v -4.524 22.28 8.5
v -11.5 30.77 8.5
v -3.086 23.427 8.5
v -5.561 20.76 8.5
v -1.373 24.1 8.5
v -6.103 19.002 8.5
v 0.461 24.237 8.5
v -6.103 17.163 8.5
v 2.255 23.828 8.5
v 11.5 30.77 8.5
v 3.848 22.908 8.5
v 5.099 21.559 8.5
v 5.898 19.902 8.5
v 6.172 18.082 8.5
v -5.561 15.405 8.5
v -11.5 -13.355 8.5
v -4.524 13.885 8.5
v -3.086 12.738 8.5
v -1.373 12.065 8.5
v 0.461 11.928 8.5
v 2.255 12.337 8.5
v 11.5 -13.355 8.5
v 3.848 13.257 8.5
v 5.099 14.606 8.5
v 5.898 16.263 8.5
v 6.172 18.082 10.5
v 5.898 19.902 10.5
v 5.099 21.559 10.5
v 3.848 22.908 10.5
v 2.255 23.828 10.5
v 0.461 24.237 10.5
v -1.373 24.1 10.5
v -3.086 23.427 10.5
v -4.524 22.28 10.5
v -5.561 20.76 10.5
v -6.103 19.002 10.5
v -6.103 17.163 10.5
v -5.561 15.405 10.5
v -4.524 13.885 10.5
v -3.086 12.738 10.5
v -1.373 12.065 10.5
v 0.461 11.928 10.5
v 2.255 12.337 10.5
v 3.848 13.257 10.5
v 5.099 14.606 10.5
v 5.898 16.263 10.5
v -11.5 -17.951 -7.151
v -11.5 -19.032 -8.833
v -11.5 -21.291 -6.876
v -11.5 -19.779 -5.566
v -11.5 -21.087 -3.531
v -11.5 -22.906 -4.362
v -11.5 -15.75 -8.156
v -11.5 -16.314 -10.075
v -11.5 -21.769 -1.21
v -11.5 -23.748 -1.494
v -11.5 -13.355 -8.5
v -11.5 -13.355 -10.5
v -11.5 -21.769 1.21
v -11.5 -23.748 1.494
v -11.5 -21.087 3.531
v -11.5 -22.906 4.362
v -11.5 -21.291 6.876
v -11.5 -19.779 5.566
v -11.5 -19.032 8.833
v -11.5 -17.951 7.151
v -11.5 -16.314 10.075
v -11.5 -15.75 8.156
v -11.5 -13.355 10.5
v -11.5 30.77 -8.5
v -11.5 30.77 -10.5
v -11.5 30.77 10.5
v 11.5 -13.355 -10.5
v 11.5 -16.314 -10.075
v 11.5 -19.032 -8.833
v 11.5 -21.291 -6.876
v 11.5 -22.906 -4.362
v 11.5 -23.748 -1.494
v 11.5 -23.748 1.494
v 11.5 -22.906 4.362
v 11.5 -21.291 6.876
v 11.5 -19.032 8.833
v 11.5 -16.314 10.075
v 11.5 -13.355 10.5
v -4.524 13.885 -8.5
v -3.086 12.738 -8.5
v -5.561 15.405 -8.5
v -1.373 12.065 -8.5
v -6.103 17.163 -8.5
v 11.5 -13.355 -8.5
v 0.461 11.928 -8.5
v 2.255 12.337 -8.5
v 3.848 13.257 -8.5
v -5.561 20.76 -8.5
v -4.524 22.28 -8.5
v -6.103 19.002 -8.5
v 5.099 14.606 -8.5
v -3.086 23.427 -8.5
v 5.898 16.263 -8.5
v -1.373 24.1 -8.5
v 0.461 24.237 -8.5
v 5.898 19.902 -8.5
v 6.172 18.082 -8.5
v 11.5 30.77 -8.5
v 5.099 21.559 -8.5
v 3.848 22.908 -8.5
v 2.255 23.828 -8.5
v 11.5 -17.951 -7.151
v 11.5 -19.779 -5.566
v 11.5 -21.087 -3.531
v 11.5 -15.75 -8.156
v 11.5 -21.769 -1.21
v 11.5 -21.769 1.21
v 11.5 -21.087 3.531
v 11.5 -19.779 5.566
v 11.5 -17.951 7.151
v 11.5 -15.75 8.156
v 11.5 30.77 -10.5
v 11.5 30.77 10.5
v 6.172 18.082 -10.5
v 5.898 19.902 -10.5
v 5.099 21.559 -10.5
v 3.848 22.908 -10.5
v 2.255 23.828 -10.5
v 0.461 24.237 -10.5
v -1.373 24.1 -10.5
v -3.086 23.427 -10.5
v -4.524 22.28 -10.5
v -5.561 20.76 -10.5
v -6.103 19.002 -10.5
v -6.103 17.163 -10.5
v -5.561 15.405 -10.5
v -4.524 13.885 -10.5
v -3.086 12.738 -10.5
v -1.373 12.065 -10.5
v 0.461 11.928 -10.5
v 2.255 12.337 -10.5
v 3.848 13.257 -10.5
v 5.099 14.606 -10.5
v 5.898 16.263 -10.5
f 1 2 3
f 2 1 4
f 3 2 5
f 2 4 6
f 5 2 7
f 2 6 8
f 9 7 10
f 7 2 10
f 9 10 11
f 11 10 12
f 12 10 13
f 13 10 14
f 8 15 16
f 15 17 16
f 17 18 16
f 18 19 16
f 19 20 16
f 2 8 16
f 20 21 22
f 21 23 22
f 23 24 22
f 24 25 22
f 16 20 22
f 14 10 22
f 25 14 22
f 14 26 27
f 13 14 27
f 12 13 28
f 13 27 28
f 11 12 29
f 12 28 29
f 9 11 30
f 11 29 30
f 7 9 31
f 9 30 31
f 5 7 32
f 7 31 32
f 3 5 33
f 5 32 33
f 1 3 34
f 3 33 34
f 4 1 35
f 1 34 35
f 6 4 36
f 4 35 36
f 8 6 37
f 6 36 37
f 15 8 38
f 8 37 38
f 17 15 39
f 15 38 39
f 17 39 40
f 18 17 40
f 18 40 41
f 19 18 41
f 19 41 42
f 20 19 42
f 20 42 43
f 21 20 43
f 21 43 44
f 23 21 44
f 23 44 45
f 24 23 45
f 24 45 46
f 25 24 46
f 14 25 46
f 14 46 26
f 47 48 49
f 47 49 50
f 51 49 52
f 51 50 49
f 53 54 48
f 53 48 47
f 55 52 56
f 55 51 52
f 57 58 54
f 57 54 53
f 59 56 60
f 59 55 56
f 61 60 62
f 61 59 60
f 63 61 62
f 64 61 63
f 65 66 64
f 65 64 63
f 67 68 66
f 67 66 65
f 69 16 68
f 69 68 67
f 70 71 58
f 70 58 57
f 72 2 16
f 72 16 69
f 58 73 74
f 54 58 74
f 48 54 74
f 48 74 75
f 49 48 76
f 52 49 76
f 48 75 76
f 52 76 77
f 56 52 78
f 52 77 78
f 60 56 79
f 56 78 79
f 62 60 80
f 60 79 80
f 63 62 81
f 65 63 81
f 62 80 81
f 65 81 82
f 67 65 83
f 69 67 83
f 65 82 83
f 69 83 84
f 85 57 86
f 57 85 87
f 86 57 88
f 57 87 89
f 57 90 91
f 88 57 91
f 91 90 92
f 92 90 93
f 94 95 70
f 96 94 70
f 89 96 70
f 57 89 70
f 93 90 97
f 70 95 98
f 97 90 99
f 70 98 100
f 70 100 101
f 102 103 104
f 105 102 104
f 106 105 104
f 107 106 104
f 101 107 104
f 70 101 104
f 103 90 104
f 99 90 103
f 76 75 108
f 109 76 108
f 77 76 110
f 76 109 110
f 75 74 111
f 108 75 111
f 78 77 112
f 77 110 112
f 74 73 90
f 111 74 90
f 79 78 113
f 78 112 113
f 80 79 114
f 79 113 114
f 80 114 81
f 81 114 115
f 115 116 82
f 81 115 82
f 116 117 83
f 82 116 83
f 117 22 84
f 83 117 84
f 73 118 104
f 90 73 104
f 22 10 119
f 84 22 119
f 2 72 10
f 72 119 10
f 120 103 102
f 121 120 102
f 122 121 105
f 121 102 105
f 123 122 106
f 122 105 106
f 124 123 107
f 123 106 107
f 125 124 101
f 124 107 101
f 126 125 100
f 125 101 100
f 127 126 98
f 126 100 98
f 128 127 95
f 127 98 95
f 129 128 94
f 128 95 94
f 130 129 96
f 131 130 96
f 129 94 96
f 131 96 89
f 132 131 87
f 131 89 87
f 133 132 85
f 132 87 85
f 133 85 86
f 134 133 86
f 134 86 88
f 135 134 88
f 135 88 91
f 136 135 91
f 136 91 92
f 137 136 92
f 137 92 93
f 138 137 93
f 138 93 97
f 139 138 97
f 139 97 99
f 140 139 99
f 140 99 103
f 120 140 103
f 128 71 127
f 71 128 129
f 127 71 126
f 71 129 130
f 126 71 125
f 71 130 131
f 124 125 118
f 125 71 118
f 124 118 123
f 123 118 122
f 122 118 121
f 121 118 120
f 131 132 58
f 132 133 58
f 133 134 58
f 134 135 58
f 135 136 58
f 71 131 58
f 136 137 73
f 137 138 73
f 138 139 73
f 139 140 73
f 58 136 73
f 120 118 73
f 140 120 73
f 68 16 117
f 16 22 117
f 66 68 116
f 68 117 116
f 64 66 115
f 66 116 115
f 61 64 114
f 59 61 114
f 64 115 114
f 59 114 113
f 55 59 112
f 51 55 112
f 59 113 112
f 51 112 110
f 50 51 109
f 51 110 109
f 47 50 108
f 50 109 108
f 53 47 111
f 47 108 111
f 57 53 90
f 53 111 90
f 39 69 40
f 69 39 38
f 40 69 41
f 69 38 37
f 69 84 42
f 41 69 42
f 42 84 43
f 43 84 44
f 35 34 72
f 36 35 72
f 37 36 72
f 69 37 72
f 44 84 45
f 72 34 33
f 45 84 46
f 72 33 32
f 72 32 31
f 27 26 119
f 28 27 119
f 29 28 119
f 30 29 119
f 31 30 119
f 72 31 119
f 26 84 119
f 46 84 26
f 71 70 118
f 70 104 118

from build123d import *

# Parameters (mm, degrees)
BOSS_EXTRUDE1_DEPTH = 11.5
SKETCH3_R           = 6.171796323
CUT_EXTRUDE1_DEPTH  = 22


with BuildPart() as part:
    # Sketch2 → Boss-Extrude1 (new body, symmetric)
    with BuildSketch(Plane(origin=(0, 0, 0), x_dir=(0, 0, -1), z_dir=(1, 0, 0))):
        with BuildLine():
            Line((-10.5, -13.355315719), (-10.5, 30.769844031))
            Line((-10.5, 30.769844031), (-8.5, 30.769844031))
            Line((-8.5, 30.769844031), (-8.5, -13.355315719))
            ThreePointArc((-8.5, -13.355315719), (0, -21.855315719), (8.5, -13.355315719))
            Line((8.5, -13.355315719), (8.5, 30.769844031))
            Line((8.5, 30.769844031), (10.5, 30.769844031))
            Line((10.5, 30.769844031), (10.5, -13.355315719))
            ThreePointArc((10.5, -13.355315719), (0, -23.855315719), (-10.5, -13.355315719))
        make_face()
    extrude(amount=BOSS_EXTRUDE1_DEPTH, both=True)

    # Sketch3 → Cut-Extrude1 (cut, through all)
    with BuildSketch(Plane.XY.offset(10.5)):
        with Locations((0, 18.082496022)):
            Circle(SKETCH3_R)
    extrude(amount=-CUT_EXTRUDE1_DEPTH, mode=Mode.SUBTRACT)


solid = part.part
